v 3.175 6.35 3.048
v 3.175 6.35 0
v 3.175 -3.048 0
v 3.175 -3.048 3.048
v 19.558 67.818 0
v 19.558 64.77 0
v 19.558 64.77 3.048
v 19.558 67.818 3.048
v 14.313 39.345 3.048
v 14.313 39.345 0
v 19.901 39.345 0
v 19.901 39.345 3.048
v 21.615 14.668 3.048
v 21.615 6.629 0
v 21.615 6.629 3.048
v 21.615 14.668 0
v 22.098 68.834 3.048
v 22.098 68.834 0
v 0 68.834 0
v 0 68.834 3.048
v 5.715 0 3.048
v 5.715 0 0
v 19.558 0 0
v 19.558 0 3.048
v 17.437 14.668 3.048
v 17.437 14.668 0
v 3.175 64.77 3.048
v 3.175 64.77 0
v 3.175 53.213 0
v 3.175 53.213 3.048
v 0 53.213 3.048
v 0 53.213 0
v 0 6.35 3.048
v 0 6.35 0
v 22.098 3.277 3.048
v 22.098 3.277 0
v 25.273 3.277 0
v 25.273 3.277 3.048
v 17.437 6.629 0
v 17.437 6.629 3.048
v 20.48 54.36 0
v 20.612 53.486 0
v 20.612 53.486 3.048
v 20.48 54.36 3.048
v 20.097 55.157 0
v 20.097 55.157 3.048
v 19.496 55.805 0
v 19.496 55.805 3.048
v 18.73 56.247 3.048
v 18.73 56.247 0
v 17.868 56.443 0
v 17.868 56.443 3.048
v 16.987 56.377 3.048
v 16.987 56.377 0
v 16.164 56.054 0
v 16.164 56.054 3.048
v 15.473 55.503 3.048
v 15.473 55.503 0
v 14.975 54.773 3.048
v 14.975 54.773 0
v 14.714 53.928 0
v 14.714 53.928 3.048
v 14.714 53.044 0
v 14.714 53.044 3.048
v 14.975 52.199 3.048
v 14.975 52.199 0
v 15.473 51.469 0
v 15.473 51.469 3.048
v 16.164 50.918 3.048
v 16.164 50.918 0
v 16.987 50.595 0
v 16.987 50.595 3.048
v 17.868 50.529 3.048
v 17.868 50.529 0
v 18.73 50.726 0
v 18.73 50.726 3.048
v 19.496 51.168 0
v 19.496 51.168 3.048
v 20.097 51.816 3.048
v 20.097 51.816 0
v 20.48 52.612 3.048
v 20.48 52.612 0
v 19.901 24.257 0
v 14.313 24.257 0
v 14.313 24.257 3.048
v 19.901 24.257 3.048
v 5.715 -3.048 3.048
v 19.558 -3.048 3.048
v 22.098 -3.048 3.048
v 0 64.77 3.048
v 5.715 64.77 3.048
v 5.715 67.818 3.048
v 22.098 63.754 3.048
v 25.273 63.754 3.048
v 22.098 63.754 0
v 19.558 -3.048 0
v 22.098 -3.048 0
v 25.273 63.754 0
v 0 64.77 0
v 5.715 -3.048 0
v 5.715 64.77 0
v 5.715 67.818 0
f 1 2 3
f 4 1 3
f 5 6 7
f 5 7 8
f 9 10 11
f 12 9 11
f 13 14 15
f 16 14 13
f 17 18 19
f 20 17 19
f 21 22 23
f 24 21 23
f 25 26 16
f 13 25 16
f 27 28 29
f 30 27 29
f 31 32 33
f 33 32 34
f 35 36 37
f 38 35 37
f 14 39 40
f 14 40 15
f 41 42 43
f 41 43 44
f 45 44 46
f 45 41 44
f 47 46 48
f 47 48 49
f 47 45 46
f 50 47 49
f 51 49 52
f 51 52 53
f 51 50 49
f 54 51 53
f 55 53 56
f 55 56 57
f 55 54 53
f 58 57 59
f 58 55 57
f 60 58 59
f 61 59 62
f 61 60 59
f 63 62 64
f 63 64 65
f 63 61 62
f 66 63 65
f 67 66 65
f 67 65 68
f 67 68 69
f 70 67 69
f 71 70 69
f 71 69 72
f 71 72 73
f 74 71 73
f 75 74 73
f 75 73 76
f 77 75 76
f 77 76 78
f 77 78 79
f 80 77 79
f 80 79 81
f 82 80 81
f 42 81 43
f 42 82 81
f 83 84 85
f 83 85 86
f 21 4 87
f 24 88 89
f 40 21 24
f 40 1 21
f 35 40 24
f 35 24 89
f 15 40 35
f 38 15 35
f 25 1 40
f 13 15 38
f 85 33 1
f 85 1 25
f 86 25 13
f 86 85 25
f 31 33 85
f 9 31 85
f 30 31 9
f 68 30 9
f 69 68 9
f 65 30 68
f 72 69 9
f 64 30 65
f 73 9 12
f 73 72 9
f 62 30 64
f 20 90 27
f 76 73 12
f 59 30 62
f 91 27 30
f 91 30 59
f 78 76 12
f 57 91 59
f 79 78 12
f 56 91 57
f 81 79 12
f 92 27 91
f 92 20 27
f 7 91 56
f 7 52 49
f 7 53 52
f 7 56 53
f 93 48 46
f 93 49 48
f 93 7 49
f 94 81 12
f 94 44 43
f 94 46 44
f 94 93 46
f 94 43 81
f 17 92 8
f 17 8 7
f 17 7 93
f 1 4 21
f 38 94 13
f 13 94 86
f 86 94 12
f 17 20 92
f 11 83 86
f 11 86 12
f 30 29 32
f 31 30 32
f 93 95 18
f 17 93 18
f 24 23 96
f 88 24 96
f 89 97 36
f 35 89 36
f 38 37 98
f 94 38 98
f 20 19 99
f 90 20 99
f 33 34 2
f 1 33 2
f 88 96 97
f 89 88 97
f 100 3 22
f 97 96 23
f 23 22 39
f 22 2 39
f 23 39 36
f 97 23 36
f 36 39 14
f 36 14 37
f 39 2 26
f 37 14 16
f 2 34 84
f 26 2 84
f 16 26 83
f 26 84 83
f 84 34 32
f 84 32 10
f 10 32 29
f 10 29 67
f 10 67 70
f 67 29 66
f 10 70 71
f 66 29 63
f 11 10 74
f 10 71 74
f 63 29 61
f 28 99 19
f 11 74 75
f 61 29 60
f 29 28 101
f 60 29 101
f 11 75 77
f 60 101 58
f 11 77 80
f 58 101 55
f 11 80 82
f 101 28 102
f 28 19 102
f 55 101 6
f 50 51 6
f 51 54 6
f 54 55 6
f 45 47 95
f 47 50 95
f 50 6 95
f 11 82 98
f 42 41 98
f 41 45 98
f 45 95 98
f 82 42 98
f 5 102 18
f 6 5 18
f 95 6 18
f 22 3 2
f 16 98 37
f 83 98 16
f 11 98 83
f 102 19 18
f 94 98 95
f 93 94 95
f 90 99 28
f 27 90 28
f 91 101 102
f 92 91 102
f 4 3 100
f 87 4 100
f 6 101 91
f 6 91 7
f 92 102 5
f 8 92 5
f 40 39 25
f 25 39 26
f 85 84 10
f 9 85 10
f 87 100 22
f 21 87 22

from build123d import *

# Parameters (mm, degrees)
SKETCH1_W           = 4.1783
SKETCH1_H           = 8.0391
SKETCH1_W_2         = 5.588
SKETCH1_H_2         = 15.0876
SKETCH1_W_3         = 13.843
SKETCH1_H_3         = 3.048
SKETCH1_R           = 2.96545
BOSS_EXTRUDE1_DEPTH = 3.048


with BuildPart() as part:
    # Sketch1 → Boss-Extrude1 (new body)
    with BuildSketch(Plane.XY):
        Polygon((3.175, 64.77), (3.175, 53.213), (0, 53.213), (0, 6.35), (3.175, 6.35), (3.175, -3.048), (5.715, -3.048), (5.715, 0), (19.558, 0), (19.558, -3.048), (22.098, -3.048), (22.098, 3.2766), (25.273, 3.2766), (25.273, 63.754), (22.098, 63.754), (22.098, 68.834), (0, 68.834), (0, 64.77), align=None)
        with Locations((19.52625, 10.64895)):
            Rectangle(SKETCH1_W, SKETCH1_H, mode=Mode.SUBTRACT)
        with Locations((17.1069, 31.8008)):
            Rectangle(SKETCH1_W_2, SKETCH1_H_2, mode=Mode.SUBTRACT)
        with Locations((12.6365, 66.294)):
            Rectangle(SKETCH1_W_3, SKETCH1_H_3, mode=Mode.SUBTRACT)
        with Locations((17.64665, 53.48605)):
            Circle(SKETCH1_R, mode=Mode.SUBTRACT)
    extrude(amount=BOSS_EXTRUDE1_DEPTH)


solid = part.part
